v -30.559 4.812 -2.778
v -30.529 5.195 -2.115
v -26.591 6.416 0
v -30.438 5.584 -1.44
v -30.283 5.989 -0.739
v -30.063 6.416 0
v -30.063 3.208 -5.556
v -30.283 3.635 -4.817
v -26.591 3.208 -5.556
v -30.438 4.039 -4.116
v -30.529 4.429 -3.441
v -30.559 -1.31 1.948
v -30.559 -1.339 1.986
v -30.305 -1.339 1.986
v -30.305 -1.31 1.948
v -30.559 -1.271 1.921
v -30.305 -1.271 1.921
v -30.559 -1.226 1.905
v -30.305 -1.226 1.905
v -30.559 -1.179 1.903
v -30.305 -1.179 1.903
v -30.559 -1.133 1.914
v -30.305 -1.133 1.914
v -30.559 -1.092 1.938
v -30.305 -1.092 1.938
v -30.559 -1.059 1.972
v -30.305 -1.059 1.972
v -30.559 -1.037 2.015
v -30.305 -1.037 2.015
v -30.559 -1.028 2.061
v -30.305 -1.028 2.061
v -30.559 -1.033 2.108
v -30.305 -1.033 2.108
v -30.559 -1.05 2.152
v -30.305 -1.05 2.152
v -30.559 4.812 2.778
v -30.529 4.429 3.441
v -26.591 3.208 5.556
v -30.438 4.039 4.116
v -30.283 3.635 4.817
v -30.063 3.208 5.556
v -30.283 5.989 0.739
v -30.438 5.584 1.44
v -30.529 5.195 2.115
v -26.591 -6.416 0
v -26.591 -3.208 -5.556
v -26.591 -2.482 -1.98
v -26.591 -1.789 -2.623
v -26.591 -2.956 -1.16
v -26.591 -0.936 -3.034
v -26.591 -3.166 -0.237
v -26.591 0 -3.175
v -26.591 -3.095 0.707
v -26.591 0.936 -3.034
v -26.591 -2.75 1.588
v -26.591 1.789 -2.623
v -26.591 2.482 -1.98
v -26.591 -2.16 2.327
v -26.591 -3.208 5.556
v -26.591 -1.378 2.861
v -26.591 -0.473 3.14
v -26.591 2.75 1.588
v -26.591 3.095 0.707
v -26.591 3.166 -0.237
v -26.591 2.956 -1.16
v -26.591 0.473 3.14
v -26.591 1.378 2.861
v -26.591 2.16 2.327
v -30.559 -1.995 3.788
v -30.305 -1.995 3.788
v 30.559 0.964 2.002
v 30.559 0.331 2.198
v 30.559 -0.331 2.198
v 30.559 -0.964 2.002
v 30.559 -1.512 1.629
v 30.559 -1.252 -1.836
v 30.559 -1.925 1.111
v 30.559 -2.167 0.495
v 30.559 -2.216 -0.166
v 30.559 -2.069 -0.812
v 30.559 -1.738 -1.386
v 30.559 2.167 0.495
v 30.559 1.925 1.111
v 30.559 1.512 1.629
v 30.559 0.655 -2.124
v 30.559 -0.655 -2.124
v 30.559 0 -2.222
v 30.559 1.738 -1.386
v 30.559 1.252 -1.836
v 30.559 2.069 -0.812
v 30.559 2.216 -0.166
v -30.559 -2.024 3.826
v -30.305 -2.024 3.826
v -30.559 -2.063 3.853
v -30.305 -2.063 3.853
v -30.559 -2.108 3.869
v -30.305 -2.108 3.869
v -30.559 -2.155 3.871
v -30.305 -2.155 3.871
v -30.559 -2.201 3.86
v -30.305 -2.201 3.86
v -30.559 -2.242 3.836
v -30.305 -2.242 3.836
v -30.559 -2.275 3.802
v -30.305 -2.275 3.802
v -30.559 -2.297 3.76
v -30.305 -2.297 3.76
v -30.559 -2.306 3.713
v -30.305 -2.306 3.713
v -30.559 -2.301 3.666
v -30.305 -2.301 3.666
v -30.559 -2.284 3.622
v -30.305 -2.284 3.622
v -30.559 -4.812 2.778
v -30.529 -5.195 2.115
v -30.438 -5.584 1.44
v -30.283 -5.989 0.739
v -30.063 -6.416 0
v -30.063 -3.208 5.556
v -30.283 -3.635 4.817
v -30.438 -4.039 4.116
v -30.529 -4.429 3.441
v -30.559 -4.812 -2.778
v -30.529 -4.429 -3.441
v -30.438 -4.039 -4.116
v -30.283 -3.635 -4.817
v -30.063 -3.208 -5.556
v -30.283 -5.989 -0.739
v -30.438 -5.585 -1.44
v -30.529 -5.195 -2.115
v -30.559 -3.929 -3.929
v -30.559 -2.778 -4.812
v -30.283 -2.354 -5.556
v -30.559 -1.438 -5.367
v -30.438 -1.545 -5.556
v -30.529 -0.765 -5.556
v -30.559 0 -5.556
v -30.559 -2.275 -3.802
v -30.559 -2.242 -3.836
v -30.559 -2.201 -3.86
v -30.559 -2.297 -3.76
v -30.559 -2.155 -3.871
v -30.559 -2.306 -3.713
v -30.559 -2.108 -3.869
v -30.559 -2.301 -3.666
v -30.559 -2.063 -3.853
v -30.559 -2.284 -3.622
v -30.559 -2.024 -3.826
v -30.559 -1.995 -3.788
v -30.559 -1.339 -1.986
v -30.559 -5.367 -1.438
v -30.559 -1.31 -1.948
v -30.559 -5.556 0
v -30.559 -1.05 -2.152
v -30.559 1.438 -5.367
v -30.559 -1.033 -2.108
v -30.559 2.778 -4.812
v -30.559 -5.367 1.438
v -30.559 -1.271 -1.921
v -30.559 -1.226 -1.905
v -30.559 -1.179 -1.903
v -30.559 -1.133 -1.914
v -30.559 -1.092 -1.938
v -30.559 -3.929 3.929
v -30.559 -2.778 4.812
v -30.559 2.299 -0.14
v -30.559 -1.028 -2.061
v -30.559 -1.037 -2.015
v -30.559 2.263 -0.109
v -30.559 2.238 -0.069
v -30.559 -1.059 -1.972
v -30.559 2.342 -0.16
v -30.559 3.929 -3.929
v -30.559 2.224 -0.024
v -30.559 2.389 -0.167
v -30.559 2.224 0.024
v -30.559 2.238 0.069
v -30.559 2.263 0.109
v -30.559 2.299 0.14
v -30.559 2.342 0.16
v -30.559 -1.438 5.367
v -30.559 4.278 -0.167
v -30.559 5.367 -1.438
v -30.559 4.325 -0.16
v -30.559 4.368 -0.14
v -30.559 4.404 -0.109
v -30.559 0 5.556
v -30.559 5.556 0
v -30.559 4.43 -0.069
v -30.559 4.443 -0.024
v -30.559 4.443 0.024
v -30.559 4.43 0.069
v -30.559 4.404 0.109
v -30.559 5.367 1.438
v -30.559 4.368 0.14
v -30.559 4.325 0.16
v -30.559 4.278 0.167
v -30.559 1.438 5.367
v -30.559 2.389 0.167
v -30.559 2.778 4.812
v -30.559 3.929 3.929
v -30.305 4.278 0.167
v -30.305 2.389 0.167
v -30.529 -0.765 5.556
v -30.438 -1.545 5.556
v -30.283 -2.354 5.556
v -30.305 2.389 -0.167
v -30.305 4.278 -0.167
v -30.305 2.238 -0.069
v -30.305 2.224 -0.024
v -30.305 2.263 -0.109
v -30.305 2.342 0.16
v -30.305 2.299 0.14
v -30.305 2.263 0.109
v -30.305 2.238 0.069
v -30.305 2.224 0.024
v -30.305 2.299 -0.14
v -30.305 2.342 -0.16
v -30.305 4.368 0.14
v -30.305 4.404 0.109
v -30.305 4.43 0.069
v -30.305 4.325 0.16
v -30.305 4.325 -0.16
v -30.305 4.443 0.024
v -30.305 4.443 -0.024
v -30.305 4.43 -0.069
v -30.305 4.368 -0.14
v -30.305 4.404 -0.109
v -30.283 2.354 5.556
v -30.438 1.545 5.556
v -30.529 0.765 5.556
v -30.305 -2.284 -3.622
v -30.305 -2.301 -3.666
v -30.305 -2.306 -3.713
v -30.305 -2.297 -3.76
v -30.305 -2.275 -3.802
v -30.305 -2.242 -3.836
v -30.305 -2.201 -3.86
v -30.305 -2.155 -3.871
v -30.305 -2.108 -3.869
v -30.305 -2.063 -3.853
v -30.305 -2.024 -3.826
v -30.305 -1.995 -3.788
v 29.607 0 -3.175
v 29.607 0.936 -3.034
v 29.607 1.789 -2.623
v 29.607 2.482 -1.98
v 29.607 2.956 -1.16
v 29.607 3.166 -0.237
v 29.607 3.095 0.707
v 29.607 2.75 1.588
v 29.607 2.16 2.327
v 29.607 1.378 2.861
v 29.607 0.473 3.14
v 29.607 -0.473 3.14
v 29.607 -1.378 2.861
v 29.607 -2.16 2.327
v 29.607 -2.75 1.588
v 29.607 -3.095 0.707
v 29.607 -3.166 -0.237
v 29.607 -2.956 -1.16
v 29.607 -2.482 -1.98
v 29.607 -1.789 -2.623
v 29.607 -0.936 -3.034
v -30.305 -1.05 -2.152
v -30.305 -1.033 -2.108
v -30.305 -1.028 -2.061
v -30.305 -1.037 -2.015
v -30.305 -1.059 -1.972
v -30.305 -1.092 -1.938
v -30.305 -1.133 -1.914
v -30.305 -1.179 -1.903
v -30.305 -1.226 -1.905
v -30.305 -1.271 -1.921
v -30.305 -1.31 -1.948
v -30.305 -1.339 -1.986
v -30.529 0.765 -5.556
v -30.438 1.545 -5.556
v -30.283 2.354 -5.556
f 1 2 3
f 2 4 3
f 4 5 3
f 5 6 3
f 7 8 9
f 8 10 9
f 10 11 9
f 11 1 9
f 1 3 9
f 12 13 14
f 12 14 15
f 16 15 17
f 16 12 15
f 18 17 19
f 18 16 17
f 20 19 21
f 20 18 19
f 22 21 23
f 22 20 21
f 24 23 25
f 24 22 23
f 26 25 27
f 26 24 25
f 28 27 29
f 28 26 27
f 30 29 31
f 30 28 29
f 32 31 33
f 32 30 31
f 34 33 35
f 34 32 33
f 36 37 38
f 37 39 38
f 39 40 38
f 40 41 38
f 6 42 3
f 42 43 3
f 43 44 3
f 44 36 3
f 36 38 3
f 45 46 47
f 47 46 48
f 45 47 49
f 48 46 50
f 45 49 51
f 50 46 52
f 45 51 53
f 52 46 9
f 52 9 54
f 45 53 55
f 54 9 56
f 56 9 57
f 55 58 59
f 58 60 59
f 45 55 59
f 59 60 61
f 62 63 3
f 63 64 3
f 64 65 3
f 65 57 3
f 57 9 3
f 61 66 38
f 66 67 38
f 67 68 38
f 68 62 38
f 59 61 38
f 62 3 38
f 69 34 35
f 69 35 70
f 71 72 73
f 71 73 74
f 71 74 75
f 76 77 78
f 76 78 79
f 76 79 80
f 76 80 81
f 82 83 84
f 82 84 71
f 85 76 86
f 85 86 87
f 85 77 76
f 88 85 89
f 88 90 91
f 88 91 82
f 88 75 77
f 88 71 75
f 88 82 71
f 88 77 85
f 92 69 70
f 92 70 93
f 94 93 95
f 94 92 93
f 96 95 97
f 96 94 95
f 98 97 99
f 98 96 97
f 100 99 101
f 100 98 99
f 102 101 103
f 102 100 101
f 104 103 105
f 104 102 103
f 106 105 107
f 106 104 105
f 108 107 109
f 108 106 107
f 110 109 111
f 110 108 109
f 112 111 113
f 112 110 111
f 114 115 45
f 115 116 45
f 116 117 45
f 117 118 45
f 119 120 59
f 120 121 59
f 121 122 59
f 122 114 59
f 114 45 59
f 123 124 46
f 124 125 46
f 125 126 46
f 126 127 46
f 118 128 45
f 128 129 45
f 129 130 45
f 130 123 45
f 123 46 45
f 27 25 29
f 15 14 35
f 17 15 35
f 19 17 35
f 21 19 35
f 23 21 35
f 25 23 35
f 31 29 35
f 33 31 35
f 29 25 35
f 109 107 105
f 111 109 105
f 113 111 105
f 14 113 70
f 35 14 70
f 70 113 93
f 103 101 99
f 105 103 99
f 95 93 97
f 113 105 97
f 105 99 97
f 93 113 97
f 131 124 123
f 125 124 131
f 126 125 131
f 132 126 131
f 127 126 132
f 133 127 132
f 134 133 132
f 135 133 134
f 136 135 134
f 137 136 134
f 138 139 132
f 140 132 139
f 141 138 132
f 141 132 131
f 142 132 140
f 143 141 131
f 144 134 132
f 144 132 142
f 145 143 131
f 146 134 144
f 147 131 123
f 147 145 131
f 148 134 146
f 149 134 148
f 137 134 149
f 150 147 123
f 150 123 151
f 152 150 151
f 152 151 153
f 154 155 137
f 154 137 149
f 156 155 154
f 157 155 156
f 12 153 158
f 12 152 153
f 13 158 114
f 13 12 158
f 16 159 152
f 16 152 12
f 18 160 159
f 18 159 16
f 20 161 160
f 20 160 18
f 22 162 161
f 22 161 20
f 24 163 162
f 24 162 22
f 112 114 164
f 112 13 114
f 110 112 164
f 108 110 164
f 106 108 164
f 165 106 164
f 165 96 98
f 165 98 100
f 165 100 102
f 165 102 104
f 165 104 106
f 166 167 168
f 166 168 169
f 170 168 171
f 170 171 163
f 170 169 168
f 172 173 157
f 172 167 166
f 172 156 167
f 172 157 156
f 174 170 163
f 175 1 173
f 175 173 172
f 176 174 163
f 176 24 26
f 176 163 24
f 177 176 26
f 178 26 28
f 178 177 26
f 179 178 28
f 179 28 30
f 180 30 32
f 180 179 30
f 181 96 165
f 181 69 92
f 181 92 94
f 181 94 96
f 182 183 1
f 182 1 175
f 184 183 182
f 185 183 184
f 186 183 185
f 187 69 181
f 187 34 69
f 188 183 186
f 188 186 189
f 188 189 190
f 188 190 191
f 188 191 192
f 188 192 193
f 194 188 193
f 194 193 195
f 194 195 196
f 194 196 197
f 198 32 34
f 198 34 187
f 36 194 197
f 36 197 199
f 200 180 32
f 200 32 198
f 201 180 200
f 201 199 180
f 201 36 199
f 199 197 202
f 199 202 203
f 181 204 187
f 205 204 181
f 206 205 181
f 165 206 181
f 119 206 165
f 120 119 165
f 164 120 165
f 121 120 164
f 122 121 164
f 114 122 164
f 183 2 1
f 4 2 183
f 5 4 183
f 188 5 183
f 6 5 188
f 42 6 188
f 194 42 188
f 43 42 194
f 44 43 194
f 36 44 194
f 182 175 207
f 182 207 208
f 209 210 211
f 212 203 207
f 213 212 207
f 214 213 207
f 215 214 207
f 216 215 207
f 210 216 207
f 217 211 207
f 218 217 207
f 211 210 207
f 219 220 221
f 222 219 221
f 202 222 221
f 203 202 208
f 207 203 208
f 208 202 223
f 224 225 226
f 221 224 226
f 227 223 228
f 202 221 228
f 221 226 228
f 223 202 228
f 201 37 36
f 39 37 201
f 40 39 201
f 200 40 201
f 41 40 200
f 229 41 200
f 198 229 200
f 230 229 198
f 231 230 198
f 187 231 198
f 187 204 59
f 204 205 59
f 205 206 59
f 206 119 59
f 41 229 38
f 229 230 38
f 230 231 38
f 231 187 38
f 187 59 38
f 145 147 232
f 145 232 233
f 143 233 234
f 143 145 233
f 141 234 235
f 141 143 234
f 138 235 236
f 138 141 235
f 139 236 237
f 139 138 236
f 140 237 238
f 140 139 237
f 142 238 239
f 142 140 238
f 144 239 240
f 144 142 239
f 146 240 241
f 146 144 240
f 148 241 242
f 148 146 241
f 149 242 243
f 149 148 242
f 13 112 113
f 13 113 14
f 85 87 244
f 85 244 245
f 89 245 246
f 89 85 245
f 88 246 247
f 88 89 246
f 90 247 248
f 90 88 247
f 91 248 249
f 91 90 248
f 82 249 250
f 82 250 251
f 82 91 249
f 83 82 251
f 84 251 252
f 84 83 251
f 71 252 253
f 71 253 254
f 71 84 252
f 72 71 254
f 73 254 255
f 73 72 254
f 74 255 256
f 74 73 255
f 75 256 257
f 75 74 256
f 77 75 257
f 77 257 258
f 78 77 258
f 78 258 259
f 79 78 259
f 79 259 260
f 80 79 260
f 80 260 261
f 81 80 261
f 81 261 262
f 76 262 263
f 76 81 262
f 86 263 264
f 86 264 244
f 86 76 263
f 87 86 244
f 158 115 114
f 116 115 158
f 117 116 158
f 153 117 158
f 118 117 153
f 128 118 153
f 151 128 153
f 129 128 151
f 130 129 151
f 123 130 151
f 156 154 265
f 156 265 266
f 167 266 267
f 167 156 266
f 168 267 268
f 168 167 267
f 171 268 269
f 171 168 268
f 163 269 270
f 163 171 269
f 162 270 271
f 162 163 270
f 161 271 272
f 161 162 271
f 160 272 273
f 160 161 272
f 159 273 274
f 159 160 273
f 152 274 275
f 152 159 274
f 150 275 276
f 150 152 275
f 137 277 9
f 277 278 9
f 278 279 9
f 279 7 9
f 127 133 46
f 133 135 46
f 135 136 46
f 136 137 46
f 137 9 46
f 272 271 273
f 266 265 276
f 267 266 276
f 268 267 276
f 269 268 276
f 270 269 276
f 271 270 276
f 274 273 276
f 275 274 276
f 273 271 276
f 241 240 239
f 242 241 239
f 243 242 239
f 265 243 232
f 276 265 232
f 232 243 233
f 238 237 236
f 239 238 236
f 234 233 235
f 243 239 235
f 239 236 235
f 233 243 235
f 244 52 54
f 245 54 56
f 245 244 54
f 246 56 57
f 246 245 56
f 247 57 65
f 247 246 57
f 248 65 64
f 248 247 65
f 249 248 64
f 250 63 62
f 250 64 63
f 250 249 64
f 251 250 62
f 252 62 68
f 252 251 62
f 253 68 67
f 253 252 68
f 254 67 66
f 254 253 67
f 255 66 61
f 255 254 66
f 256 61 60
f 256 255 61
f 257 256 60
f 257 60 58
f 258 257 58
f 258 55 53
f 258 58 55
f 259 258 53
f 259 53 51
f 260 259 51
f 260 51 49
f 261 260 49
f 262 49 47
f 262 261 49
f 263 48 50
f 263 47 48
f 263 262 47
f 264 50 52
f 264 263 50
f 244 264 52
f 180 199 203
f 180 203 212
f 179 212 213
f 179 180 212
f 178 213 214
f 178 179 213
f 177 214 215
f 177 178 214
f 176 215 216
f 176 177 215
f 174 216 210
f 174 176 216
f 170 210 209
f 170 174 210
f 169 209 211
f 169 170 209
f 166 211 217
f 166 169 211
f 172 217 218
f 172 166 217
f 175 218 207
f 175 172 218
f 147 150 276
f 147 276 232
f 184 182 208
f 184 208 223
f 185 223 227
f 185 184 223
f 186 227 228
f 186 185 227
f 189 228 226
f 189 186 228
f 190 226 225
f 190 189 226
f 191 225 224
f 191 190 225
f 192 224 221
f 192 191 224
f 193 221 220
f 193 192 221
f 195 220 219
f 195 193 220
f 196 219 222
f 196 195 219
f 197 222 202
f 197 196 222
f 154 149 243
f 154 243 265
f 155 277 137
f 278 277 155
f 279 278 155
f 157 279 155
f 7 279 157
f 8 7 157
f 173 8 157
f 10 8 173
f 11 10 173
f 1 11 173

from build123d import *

# Parameters (mm, degrees)
SKETCH5_R           = 3.175
BOSS_EXTRUDE3_DEPTH = 57.15
CHAMFER1_SIZE       = 0.9525
BOSS_EXTRUDE4_DEPTH = 3.96875
SKETCH8_OUTSIDE_W   = 240.984
SKETCH8_OUTSIDE_H   = 242.704
SKETCH8_OUTSIDE_R   = 5.55625
CUT_EXTRUDE3_DEPTH  = 62.11875
CUT_EXTRUDE3_TAPER  = 60
CUT_EXTRUDE4_DEPTH  = 0.254
CIRPATTERN1_COUNT   = 3


with BuildPart() as part:
    # Sketch5 → Boss-Extrude3 (new body)
    with BuildSketch(Plane(origin=(30.559375, 0, 0), x_dir=(0, 0, -1), z_dir=(1, 0, 0))):
        Circle(SKETCH5_R)
    extrude(amount=-BOSS_EXTRUDE3_DEPTH)

    # Chamfer1
    chamfer1_edges = [part.edges().sort_by_distance(p)[0] for p in [
        (30.559375, 0, 3.175),
    ]]
    chamfer(chamfer1_edges, length=CHAMFER1_SIZE)

    # Sketch11 → Revolve1 (revolve)
    with BuildSketch(Plane.XY):
        Polygon((-26.590625, 3.175), (-26.590625, 0), (14.684375, 0), (11.509375, 3.175), align=None)
    revolve(axis=Axis((-26.590625, 0, 0), (1, 0, 0)))

    # Sketch6 → Boss-Extrude4 (add)
    with BuildSketch(Plane.ZY.offset(26.590625)):
        Polygon((5.55625, 3.207902433), (0, 6.415804866), (-5.55625, 3.207902433), (-5.55625, -3.207902433), (0, -6.415804866), (5.55625, -3.207902433), align=None)
    extrude(amount=BOSS_EXTRUDE4_DEPTH)

    # Sketch8 outside → Cut-Extrude3 (cut, through all)
    with BuildSketch(Plane.ZY.offset(30.559375)):
        Rectangle(SKETCH8_OUTSIDE_W, SKETCH8_OUTSIDE_H)
        Circle(SKETCH8_OUTSIDE_R, mode=Mode.SUBTRACT)
    extrude(amount=-CUT_EXTRUDE3_DEPTH, taper=CUT_EXTRUDE3_TAPER, mode=Mode.SUBTRACT)

    # Sketch12 → Cut-Extrude4 (cut)
    with BuildSketch(Plane.ZY.offset(30.559375)):
        with BuildLine():
            Line((0.1666875, 4.2783125), (0.1666875, 2.3891875))
            ThreePointArc((0.1666875, 2.3891875), (0, 2.2225), (-0.1666875, 2.3891875))
            Line((-0.1666875, 2.3891875), (-0.1666875, 4.2783125))
            ThreePointArc((-0.1666875, 4.2783125), (0, 4.445), (0.1666875, 4.2783125))
        make_face()
    cut_extrude4 = extrude(amount=-CUT_EXTRUDE4_DEPTH, mode=Mode.SUBTRACT)

    # CirPattern1: Cut-Extrude4 ×3 about axis
    cirpattern1_axis = Axis((0, 0, 0), (1, 0, 0))
    for i in range(1, CIRPATTERN1_COUNT):
        add(cut_extrude4.rotate(cirpattern1_axis, i * 360 / CIRPATTERN1_COUNT), mode=Mode.SUBTRACT)


solid = part.part
